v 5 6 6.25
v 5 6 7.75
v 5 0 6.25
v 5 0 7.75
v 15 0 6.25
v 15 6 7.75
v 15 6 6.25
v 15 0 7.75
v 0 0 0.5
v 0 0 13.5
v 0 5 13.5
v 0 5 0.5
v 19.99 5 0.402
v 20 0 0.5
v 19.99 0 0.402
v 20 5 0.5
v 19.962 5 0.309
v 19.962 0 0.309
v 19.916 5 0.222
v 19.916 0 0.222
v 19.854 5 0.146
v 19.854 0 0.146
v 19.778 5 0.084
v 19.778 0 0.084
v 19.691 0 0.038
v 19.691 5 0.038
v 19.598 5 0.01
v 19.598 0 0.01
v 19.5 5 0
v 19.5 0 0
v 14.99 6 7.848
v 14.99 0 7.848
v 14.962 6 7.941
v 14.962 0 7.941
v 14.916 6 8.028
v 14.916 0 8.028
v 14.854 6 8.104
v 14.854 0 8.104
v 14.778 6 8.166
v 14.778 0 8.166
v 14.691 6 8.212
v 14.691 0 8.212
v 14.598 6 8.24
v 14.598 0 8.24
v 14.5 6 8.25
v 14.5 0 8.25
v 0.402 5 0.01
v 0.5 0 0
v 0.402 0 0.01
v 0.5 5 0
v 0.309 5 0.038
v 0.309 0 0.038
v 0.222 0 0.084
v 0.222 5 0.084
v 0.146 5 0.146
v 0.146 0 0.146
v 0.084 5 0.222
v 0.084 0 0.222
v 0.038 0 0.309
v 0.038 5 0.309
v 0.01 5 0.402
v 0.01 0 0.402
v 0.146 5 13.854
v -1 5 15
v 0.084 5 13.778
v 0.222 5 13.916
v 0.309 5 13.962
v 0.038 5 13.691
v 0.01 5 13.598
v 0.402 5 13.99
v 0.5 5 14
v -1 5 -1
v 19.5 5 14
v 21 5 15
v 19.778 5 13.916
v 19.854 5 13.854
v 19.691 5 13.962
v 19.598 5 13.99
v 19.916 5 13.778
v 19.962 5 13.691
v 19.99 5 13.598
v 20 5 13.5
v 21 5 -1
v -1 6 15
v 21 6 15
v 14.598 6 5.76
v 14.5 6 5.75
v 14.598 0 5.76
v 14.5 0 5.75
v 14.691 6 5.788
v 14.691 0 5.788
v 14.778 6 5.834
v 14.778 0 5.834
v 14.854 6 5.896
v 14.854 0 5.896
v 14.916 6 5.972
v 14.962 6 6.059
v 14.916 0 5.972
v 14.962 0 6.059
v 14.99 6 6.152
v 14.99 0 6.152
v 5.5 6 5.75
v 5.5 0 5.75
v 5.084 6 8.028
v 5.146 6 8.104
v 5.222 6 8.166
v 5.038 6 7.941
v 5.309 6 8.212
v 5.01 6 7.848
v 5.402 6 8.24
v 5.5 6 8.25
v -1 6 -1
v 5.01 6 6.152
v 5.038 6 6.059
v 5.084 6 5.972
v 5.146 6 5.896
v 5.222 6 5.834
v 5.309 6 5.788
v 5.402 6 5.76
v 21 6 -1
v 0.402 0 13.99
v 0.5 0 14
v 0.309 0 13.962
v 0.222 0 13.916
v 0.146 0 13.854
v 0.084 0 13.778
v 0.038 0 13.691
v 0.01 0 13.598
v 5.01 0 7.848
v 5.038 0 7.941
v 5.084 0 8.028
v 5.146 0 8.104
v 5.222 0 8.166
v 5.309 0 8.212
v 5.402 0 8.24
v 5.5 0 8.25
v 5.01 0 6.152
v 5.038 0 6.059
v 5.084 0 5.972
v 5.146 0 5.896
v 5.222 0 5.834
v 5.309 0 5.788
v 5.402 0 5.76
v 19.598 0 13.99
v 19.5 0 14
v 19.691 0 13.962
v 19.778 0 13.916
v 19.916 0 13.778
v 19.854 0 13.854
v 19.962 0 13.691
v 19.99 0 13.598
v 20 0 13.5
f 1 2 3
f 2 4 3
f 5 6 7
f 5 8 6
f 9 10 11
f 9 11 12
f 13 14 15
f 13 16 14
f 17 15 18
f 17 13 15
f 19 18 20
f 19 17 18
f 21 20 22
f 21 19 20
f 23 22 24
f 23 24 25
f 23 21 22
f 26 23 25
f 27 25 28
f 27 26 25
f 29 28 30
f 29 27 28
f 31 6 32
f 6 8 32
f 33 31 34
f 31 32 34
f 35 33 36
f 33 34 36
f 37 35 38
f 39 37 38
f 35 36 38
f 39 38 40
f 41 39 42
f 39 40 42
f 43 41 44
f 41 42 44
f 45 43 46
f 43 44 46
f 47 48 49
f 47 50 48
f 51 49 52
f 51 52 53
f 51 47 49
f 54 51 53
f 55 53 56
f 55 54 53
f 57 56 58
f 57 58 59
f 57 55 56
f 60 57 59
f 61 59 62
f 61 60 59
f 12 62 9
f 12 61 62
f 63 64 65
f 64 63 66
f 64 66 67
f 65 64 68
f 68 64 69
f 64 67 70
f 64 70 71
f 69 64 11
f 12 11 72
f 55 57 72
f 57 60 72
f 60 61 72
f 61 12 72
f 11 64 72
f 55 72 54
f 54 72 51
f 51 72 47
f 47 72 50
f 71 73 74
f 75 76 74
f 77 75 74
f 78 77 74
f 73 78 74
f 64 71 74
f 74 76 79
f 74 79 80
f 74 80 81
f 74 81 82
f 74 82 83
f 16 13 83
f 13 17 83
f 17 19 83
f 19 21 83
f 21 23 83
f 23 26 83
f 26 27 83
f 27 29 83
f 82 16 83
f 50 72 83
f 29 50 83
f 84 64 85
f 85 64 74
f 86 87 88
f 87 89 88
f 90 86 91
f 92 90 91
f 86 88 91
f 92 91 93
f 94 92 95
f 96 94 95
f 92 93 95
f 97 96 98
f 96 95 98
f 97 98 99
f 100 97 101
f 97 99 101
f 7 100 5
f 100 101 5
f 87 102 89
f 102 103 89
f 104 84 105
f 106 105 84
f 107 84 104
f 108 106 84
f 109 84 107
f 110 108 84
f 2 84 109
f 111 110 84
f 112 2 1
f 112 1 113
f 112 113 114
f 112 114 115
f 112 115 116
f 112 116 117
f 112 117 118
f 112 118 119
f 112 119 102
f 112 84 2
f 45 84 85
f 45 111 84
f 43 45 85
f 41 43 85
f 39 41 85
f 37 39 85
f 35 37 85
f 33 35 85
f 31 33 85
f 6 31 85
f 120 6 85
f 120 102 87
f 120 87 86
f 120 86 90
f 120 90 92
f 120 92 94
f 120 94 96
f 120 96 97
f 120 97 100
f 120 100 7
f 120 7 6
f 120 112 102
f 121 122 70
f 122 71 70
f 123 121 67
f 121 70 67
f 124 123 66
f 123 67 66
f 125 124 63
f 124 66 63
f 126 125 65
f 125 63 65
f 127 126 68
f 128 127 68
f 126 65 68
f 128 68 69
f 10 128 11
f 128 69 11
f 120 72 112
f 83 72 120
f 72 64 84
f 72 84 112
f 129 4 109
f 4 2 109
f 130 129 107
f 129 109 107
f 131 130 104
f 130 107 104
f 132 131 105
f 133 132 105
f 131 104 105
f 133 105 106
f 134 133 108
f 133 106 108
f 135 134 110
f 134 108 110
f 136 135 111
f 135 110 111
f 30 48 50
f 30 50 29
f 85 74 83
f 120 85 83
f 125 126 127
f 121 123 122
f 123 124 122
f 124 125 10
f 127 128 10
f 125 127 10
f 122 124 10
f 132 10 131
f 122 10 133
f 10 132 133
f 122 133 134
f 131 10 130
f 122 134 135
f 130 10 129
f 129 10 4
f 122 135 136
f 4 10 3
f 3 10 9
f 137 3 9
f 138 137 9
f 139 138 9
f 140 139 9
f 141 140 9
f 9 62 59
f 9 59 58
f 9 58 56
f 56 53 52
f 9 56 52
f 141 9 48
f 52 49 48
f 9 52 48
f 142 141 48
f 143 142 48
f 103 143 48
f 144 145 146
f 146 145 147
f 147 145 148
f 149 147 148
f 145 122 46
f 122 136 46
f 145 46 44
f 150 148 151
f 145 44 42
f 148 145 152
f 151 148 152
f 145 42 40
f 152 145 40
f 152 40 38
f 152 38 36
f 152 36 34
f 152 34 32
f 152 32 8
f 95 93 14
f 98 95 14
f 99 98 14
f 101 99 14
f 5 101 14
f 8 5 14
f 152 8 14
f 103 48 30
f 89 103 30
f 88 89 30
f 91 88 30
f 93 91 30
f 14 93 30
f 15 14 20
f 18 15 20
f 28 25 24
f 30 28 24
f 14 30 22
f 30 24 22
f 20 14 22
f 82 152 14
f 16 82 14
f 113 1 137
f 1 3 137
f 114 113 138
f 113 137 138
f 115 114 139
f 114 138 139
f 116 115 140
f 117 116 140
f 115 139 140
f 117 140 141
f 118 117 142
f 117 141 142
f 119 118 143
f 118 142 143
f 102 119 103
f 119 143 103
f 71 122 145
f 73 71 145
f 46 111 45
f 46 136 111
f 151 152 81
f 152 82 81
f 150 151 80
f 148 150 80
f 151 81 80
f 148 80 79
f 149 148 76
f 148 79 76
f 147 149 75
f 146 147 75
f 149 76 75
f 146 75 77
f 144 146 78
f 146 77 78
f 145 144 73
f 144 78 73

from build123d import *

# Parameters (mm, degrees)
SKETCH1_W           = 20
SKETCH1_H           = 14
SKETCH1_W_2         = 10
SKETCH1_H_2         = 2.5
BOSS_EXTRUDE1_DEPTH = 5
SKETCH2_W           = 22
SKETCH2_H           = 16
SKETCH2_W_2         = 10
SKETCH2_H_2         = 2.5
BOSS_EXTRUDE2_DEPTH = 1
FILLET1_R           = 0.5


with BuildPart() as part:
    # Sketch1 → Boss-Extrude1 (new body)
    with BuildSketch(Plane(origin=(0, 0, 0), x_dir=(1, 0, 0), z_dir=(0, 1, 0))):
        with Locations((10, -7)):
            Rectangle(SKETCH1_W, SKETCH1_H)
        with Locations((10, -7)):
            Rectangle(SKETCH1_W_2, SKETCH1_H_2, mode=Mode.SUBTRACT)
    extrude(amount=BOSS_EXTRUDE1_DEPTH)

    # Sketch2 → Boss-Extrude2 (add)
    with BuildSketch(Plane(origin=(0, 5, 0), x_dir=(1, 0, 0), z_dir=(0, 1, 0))):
        with Locations((10, -7)):
            Rectangle(SKETCH2_W, SKETCH2_H)
        with Locations((10, -7)):
            Rectangle(SKETCH2_W_2, SKETCH2_H_2, mode=Mode.SUBTRACT)
    extrude(amount=BOSS_EXTRUDE2_DEPTH)

    # Fillet1
    fillet1_edges = [part.edges().sort_by_distance(p)[0] for p in [
        (15, 3, 8.25),
        (15, 3, 5.75),
        (5, 3, 5.75),
        (5, 3, 8.25),
        (0, 2.5, 0),
        (20, 2.5, 0),
        (20, 2.5, 14),
        (0, 2.5, 14),
    ]]
    fillet(fillet1_edges, radius=FILLET1_R)


solid = part.part
